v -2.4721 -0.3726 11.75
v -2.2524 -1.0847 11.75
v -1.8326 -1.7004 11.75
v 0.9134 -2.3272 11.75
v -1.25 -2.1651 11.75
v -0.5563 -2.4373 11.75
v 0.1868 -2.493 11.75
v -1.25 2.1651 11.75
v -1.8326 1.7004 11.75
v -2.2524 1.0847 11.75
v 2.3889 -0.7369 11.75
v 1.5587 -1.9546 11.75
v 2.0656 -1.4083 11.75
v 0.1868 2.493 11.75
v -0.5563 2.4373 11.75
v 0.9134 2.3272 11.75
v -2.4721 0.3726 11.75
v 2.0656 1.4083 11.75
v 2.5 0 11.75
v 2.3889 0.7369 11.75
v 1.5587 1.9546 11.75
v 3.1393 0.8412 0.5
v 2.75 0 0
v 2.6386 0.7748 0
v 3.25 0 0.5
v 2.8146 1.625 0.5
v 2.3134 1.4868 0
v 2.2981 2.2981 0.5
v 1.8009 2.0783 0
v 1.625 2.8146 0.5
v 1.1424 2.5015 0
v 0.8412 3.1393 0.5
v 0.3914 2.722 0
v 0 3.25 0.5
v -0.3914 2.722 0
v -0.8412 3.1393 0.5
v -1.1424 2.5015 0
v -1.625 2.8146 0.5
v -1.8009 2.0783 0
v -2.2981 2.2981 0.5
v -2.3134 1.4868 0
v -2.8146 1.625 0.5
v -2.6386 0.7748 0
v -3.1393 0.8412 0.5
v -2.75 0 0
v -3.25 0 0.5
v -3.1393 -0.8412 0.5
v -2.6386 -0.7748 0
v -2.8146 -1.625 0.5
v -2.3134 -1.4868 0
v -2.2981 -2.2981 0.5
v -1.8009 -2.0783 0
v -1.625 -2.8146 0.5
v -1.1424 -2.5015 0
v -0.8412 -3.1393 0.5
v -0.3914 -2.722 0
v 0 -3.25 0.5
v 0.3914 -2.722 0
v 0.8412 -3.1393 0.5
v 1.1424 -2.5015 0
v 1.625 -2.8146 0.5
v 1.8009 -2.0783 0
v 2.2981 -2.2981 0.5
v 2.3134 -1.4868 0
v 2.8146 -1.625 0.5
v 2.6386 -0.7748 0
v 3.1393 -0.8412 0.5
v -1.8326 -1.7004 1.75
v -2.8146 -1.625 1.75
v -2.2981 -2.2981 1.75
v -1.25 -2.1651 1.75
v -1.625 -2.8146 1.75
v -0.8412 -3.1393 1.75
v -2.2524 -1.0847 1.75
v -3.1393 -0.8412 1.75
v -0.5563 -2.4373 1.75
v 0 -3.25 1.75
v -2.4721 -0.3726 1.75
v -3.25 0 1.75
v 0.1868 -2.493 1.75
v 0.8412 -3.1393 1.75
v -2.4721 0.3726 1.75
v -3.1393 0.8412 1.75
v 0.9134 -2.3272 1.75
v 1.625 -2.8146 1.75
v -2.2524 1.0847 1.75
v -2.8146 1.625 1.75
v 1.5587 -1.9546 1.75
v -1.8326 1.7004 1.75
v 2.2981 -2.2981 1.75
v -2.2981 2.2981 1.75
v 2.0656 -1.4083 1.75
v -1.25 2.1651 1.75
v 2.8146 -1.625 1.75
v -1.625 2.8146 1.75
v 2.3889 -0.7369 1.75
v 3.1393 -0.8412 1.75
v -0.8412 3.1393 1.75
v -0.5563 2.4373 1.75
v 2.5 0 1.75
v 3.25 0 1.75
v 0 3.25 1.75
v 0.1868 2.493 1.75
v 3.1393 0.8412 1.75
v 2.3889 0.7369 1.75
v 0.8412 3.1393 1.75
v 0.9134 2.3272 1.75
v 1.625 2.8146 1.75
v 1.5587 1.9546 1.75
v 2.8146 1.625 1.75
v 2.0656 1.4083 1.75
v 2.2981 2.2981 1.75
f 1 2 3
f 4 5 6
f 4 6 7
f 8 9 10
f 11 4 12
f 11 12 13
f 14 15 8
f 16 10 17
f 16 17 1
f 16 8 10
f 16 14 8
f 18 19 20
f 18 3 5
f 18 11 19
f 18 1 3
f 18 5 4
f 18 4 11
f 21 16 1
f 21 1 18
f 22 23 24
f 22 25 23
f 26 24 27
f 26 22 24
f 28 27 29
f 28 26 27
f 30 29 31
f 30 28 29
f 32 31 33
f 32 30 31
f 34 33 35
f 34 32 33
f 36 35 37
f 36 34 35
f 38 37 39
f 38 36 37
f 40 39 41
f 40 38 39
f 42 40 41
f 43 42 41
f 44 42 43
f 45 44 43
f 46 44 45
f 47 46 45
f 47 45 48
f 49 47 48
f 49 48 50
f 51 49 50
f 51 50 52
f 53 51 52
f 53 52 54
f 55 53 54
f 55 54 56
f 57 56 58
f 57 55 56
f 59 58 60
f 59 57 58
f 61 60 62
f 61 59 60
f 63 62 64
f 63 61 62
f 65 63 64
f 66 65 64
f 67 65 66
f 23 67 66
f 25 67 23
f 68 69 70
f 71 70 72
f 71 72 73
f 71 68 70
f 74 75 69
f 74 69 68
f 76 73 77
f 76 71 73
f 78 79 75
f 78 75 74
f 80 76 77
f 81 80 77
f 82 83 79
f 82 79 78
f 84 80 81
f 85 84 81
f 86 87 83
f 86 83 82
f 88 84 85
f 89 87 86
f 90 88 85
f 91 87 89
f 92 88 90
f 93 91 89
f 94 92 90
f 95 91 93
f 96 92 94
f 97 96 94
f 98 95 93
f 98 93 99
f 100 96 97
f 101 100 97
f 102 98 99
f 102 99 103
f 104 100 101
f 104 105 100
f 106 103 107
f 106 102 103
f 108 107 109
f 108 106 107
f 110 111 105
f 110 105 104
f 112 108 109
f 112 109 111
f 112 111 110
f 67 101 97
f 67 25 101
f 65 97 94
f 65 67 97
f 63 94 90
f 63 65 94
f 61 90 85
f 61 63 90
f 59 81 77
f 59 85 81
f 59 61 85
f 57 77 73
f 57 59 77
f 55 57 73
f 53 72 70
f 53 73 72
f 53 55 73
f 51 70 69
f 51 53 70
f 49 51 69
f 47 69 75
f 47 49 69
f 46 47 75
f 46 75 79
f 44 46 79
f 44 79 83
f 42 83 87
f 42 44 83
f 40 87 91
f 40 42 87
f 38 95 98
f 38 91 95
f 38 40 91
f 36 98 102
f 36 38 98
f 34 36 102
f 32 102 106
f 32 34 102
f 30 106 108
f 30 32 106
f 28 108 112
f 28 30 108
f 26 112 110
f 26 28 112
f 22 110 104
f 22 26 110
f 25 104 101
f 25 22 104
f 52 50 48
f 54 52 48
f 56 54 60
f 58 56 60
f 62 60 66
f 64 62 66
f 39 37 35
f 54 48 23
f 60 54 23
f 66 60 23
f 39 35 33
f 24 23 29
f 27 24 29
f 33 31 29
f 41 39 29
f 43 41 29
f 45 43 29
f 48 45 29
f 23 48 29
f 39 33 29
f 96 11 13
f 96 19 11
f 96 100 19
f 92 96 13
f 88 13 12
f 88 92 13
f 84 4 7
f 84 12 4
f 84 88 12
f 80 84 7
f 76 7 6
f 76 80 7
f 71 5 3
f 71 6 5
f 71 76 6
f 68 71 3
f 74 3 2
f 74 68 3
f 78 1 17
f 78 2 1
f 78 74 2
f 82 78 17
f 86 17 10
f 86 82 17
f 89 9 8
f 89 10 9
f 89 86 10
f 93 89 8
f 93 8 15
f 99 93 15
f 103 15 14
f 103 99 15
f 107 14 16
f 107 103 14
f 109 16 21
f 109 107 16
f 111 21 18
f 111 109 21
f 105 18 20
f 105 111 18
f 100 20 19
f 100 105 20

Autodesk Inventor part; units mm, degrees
ref_plane "YZ Plane" through (0, 0, 0) normal (1, 0, 0) x (0, 1, 0)
ref_plane "XZ Plane" through (0, 0, 0) normal (0, 1, 0) x (-1, 0, 0)
ref_plane "XY Plane" through (0, 0, 0) normal (0, 0, 1) x (1, 0, 0)
sketch "Sketch1" plane through (0, 0, 0) normal (0, 0, 1) x (1, 0, 0)
  circle A0 centre (0, 0) radius 3.25
extrude "Extrusion1" add sketch "Sketch1" along normal blind 1.75
sketch "Sketch2" plane through (0, 0, 1.75) normal (0, 0, 1) x (1, 0, 0)
  circle A0 centre (0, 0) radius 2.5
extrude "Extrusion2" add sketch "Sketch2" along normal blind 10
thread "Thread1" size "M3x0.5" class "6g" standard "ANSI Metric M Profile" length 10
chamfer "Chamfer1" distance 0.5 angle 45 1 edges at (-3.25, 0, 0)
properties part number "Bolt2" material "Steel, Carbon"
